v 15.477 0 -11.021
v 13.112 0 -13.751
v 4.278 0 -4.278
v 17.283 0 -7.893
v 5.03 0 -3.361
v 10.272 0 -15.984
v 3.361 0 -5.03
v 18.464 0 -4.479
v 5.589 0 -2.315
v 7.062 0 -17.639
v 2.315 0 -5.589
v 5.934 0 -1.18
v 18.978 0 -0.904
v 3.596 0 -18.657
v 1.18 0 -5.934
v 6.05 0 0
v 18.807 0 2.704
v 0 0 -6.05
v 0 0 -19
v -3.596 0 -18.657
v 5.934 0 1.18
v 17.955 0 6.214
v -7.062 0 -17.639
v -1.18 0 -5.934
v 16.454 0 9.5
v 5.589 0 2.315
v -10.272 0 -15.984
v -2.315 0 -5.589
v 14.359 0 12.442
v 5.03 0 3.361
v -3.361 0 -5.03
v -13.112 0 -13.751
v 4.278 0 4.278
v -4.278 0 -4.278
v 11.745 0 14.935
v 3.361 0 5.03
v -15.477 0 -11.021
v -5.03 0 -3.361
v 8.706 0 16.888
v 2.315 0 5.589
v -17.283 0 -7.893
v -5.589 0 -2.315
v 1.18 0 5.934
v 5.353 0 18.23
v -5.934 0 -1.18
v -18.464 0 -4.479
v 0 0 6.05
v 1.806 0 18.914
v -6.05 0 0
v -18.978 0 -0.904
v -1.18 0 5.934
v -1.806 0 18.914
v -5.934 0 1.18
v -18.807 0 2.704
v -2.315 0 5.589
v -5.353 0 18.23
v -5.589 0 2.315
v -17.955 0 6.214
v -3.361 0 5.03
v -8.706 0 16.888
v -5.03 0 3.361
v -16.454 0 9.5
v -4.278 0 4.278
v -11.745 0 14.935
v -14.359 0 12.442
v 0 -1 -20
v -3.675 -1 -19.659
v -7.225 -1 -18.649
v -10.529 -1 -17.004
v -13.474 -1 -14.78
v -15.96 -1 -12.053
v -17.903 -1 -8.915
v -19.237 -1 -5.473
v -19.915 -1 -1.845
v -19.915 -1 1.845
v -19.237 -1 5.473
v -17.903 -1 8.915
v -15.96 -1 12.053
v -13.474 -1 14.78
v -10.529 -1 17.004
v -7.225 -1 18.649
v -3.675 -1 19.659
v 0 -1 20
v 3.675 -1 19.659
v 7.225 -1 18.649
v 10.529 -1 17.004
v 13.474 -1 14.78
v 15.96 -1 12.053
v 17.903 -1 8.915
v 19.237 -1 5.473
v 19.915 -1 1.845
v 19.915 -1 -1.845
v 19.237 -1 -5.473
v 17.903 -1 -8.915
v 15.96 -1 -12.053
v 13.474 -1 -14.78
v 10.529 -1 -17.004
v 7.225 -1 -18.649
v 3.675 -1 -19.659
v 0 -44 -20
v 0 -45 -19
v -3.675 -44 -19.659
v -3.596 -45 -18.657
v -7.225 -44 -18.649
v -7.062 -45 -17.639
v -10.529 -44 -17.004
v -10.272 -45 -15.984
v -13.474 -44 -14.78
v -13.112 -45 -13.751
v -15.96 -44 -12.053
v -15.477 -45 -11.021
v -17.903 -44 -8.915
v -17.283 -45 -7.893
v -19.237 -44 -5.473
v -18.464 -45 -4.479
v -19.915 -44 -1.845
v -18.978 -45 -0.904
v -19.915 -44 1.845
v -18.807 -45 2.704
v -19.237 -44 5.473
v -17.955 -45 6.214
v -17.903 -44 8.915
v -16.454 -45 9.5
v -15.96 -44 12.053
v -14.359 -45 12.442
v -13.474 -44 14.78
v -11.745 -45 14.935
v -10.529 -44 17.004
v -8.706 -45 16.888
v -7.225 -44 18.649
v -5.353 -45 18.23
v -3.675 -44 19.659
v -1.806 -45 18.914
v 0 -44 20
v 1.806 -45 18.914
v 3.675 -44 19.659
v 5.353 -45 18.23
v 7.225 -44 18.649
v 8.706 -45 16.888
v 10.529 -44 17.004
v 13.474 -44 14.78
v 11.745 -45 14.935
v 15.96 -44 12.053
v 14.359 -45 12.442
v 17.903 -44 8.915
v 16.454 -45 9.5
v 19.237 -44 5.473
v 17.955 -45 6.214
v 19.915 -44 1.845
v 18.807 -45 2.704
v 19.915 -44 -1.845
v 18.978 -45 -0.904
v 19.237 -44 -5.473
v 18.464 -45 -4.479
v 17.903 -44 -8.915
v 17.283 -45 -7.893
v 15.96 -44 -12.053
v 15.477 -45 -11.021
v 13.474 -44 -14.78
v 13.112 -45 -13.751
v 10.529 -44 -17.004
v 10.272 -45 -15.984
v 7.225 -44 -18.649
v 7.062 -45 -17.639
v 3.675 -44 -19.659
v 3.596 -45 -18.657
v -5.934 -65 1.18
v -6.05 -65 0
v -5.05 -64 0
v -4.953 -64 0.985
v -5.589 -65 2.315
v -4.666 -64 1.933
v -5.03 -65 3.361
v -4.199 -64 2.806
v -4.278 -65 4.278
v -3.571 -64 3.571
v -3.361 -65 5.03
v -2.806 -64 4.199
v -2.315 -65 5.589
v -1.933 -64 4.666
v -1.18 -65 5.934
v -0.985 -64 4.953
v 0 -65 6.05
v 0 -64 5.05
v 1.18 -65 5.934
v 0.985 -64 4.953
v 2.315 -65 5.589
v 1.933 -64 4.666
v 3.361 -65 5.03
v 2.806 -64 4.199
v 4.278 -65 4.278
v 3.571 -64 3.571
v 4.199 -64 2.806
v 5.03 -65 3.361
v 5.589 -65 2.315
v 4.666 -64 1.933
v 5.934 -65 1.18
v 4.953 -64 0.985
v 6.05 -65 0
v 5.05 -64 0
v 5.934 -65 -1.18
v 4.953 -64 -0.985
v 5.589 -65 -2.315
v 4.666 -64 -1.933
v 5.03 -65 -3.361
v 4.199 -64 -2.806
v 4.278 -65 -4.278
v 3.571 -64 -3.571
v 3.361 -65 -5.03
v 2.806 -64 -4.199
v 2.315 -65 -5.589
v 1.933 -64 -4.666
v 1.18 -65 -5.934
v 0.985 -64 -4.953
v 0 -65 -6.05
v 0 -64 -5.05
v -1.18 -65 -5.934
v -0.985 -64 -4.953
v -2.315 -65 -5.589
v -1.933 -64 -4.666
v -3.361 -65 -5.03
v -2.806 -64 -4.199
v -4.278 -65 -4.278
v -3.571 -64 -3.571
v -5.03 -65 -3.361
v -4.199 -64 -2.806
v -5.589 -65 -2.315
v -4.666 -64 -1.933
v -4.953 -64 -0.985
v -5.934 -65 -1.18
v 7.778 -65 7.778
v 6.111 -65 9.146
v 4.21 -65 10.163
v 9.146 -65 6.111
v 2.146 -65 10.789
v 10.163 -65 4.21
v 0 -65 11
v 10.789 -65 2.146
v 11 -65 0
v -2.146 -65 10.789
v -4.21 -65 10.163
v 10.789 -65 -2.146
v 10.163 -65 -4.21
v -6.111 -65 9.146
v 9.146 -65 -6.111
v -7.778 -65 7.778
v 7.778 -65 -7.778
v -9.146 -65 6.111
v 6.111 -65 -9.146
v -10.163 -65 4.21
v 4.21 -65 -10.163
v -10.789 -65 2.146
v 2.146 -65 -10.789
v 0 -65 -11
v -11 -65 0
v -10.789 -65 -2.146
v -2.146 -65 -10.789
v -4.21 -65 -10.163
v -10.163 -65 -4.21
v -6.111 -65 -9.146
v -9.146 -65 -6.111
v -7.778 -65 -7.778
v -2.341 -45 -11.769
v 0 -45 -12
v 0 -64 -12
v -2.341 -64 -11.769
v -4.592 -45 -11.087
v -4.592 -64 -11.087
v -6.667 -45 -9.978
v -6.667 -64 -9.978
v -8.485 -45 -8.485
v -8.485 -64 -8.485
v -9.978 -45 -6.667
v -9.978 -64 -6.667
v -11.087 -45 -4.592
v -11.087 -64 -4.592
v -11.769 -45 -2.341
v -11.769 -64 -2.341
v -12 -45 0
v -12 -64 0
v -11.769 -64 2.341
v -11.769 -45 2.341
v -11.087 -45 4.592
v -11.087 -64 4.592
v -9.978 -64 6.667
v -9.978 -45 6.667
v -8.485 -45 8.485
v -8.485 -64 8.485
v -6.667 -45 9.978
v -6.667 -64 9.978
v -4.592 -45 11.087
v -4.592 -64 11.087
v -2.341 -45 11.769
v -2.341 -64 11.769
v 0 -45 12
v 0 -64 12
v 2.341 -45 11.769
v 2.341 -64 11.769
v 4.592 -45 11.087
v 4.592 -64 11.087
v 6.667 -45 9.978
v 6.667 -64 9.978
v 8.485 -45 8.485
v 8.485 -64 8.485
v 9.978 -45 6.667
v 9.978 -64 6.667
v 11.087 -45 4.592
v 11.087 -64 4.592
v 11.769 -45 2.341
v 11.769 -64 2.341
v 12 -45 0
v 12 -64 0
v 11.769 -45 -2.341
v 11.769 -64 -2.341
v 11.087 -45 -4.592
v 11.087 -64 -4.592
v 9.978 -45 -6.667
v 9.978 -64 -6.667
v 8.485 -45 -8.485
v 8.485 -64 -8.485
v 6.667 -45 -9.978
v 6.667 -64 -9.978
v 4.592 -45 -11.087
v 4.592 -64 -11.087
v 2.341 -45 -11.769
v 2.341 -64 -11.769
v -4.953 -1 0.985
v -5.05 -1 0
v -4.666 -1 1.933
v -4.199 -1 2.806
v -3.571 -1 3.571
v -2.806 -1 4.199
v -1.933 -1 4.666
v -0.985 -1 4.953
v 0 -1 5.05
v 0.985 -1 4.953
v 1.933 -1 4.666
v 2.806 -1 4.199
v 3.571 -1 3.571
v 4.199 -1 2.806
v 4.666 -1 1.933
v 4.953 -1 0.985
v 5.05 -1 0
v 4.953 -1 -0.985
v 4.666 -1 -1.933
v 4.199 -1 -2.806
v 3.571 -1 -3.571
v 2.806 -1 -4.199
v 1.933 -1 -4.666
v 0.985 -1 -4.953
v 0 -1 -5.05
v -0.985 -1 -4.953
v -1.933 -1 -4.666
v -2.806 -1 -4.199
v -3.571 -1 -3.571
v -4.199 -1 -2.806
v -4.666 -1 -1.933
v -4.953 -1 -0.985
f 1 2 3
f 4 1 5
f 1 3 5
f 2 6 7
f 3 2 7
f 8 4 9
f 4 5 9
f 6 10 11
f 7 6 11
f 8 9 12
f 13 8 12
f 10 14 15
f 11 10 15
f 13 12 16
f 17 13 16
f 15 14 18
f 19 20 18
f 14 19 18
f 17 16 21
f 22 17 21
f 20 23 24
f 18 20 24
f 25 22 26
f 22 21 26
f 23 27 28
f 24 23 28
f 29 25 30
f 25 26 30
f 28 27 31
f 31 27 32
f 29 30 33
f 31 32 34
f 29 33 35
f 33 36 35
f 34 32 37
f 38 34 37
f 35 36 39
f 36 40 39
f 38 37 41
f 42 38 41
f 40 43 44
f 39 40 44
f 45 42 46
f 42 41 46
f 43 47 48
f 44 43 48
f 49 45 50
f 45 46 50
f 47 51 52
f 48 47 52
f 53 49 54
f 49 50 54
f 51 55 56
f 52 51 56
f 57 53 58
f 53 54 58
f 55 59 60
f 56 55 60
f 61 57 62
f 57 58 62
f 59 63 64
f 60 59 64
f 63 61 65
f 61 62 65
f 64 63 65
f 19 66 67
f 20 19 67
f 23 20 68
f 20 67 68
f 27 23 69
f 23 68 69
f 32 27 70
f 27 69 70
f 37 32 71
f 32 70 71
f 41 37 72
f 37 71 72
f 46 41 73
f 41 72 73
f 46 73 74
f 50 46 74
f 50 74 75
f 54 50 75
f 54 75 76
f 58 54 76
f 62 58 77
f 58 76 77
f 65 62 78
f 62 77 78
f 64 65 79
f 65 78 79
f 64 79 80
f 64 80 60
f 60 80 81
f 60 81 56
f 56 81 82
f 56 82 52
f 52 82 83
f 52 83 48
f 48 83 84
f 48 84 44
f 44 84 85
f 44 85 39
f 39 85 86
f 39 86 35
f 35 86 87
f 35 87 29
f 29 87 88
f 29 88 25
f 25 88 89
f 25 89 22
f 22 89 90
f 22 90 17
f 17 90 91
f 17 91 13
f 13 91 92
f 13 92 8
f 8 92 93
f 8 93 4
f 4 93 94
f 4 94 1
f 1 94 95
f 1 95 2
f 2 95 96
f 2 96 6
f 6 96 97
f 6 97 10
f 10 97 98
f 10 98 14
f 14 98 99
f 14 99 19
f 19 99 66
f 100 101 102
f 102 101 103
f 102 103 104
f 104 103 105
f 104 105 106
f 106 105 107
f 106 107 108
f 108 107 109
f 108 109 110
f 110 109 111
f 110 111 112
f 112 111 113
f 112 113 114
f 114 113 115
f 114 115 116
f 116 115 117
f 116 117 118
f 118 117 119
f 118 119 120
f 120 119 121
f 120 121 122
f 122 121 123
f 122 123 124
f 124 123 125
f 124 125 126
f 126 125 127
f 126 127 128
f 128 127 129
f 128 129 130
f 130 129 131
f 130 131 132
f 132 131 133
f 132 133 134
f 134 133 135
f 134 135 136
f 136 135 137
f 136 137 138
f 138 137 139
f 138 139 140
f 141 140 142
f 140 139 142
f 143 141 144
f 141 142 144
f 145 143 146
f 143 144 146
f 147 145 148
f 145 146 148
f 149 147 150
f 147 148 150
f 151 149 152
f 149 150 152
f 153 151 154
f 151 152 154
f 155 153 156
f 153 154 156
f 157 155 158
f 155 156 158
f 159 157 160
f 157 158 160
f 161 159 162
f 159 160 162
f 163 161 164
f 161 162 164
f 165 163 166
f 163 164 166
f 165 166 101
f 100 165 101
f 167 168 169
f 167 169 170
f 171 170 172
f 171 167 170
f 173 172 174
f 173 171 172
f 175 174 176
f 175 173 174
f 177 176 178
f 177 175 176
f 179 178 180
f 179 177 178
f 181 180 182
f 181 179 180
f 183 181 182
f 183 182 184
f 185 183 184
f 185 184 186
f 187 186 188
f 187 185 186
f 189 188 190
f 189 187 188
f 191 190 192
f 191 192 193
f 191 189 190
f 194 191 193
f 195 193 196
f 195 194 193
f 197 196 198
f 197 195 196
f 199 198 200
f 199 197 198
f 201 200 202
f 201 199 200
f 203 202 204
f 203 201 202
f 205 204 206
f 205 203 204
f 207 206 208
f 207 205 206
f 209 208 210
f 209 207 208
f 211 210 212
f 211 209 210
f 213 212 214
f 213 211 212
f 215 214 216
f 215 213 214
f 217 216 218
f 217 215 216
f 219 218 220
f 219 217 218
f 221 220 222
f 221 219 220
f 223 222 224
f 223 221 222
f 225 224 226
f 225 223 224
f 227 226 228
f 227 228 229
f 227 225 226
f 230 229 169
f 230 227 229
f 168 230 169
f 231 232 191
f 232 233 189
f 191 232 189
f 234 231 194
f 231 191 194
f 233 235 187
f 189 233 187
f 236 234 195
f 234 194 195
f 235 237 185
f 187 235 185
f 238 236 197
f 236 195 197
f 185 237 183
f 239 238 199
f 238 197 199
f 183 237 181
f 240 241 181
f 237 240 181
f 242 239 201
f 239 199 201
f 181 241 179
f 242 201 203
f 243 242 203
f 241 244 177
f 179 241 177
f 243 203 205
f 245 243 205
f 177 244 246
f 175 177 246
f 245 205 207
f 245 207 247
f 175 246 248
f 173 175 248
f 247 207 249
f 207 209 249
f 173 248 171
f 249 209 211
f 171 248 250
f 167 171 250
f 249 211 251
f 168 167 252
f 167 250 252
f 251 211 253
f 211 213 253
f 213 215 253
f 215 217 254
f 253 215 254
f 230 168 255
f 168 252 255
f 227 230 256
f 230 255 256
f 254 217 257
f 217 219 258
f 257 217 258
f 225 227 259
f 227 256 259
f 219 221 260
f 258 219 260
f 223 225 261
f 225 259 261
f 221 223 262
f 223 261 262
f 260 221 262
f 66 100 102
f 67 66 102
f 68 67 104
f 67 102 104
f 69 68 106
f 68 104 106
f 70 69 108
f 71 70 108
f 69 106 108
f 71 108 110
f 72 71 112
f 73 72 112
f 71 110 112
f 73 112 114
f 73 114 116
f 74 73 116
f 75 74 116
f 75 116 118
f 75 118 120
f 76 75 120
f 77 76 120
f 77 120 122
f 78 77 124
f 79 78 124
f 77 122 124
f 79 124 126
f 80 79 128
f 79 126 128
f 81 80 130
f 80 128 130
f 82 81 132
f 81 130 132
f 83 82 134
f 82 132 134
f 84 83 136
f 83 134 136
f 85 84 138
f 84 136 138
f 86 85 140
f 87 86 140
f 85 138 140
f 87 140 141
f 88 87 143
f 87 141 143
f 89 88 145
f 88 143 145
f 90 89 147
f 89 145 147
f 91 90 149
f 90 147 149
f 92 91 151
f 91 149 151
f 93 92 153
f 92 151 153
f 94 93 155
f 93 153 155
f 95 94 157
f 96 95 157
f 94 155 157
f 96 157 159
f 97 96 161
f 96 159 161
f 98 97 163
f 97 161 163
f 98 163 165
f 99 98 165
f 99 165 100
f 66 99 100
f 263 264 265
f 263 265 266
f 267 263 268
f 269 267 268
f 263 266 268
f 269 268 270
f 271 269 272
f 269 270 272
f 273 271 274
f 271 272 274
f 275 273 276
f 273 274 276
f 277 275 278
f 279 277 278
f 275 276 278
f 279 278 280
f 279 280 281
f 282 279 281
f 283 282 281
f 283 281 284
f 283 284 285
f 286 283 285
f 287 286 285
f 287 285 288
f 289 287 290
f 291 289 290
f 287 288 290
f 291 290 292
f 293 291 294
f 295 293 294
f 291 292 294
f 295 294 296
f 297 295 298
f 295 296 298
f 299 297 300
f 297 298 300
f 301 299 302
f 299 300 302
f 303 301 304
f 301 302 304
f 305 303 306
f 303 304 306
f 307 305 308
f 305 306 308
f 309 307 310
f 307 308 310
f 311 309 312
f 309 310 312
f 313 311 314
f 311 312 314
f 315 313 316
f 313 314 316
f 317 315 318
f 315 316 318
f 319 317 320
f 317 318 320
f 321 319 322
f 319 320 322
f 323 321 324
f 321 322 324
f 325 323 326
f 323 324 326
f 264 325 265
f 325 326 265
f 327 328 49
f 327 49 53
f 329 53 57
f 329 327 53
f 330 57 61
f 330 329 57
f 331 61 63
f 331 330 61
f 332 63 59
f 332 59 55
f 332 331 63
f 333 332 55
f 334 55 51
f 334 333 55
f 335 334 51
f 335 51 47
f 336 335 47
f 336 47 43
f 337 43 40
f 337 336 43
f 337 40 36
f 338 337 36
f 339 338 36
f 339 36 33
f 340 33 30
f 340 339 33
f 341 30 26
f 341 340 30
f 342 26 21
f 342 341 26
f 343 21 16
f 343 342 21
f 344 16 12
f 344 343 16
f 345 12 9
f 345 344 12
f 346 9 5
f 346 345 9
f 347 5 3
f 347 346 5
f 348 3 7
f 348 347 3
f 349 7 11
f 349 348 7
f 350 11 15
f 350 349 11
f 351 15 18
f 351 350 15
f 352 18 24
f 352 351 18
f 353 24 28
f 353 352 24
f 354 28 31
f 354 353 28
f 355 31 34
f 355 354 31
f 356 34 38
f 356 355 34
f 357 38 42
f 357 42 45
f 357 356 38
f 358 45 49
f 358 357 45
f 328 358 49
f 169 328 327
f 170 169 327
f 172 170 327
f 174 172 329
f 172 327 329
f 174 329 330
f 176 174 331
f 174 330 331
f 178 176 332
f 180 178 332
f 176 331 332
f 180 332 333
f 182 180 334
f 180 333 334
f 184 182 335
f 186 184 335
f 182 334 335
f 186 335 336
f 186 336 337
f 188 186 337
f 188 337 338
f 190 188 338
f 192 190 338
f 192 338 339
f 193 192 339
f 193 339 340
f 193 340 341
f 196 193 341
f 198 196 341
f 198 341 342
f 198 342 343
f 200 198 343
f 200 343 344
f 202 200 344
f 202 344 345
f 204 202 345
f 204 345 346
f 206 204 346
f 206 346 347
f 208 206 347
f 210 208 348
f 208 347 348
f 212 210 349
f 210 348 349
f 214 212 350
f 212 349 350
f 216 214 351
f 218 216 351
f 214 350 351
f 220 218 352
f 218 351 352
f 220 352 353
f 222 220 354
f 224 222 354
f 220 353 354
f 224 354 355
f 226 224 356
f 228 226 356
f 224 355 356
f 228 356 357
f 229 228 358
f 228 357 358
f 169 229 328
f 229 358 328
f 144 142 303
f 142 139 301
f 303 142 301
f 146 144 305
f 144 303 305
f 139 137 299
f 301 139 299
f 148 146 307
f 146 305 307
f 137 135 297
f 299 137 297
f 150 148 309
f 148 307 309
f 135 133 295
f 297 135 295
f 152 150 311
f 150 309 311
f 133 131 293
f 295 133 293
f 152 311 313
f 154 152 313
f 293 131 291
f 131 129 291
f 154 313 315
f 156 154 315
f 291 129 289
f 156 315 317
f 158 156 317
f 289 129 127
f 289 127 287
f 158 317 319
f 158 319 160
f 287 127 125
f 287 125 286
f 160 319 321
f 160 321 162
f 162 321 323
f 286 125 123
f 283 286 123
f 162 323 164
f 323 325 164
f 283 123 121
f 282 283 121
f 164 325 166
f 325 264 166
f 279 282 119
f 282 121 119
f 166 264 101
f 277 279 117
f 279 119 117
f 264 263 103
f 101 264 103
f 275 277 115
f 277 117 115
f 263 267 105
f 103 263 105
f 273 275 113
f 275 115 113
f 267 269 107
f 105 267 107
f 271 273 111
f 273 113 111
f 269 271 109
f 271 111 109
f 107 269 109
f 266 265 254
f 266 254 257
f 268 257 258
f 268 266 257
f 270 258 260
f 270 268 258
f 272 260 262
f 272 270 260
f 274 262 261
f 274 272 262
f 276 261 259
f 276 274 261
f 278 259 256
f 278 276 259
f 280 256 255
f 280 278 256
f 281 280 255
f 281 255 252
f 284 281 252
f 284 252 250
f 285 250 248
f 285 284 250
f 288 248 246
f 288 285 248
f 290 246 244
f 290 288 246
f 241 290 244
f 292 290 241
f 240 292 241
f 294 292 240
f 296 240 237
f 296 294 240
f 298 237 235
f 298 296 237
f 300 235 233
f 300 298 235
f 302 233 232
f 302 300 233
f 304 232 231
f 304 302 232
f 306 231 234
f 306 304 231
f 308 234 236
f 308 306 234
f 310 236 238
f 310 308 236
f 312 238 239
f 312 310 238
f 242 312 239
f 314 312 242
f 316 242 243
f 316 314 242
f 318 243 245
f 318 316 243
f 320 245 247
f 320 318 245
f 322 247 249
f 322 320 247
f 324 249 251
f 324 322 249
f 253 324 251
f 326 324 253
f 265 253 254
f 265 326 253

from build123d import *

# Parameters (mm, degrees)
SKETCH2_R          = 5.05
CUT_EXTRUDE1_DEPTH = 71.887234394
CHAMFER1_SIZE      = 1


with BuildPart() as part:
    # Sketch1 → Revolve1 (revolve)
    with BuildSketch(Plane.XY, mode=Mode.PRIVATE) as revolve1_sk:
        Polygon((0, 0), (20, 0), (20, -45), (12, -45), (12, -65), (0, -65), align=None)
    revolve(revolve1_sk.sketch.rotate(Axis((0, -70, 0), (0, 1, 0)), 90), axis=Axis((0, -70, 0), (0, 1, 0)))

    # Sketch2 → Cut-Extrude1 (cut, through all)
    with BuildSketch(Plane(origin=(0, 0, 0), x_dir=(1, 0, 0), z_dir=(0, 1, 0))):
        with Locations(Location((0, 0, 0), (0, 0, 180))):
            Circle(SKETCH2_R)
    extrude(amount=-CUT_EXTRUDE1_DEPTH, mode=Mode.SUBTRACT)

    # Chamfer1
    chamfer1_edges = [part.edges().sort_by_distance(p)[0] for p in [
        (5.05, -65, 0),
        (5.05, 0, 0),
        (0, -65, 12),
        (0, -45, 20),
        (0, 0, 20),
    ]]
    chamfer(chamfer1_edges, length=CHAMFER1_SIZE)


solid = part.part
